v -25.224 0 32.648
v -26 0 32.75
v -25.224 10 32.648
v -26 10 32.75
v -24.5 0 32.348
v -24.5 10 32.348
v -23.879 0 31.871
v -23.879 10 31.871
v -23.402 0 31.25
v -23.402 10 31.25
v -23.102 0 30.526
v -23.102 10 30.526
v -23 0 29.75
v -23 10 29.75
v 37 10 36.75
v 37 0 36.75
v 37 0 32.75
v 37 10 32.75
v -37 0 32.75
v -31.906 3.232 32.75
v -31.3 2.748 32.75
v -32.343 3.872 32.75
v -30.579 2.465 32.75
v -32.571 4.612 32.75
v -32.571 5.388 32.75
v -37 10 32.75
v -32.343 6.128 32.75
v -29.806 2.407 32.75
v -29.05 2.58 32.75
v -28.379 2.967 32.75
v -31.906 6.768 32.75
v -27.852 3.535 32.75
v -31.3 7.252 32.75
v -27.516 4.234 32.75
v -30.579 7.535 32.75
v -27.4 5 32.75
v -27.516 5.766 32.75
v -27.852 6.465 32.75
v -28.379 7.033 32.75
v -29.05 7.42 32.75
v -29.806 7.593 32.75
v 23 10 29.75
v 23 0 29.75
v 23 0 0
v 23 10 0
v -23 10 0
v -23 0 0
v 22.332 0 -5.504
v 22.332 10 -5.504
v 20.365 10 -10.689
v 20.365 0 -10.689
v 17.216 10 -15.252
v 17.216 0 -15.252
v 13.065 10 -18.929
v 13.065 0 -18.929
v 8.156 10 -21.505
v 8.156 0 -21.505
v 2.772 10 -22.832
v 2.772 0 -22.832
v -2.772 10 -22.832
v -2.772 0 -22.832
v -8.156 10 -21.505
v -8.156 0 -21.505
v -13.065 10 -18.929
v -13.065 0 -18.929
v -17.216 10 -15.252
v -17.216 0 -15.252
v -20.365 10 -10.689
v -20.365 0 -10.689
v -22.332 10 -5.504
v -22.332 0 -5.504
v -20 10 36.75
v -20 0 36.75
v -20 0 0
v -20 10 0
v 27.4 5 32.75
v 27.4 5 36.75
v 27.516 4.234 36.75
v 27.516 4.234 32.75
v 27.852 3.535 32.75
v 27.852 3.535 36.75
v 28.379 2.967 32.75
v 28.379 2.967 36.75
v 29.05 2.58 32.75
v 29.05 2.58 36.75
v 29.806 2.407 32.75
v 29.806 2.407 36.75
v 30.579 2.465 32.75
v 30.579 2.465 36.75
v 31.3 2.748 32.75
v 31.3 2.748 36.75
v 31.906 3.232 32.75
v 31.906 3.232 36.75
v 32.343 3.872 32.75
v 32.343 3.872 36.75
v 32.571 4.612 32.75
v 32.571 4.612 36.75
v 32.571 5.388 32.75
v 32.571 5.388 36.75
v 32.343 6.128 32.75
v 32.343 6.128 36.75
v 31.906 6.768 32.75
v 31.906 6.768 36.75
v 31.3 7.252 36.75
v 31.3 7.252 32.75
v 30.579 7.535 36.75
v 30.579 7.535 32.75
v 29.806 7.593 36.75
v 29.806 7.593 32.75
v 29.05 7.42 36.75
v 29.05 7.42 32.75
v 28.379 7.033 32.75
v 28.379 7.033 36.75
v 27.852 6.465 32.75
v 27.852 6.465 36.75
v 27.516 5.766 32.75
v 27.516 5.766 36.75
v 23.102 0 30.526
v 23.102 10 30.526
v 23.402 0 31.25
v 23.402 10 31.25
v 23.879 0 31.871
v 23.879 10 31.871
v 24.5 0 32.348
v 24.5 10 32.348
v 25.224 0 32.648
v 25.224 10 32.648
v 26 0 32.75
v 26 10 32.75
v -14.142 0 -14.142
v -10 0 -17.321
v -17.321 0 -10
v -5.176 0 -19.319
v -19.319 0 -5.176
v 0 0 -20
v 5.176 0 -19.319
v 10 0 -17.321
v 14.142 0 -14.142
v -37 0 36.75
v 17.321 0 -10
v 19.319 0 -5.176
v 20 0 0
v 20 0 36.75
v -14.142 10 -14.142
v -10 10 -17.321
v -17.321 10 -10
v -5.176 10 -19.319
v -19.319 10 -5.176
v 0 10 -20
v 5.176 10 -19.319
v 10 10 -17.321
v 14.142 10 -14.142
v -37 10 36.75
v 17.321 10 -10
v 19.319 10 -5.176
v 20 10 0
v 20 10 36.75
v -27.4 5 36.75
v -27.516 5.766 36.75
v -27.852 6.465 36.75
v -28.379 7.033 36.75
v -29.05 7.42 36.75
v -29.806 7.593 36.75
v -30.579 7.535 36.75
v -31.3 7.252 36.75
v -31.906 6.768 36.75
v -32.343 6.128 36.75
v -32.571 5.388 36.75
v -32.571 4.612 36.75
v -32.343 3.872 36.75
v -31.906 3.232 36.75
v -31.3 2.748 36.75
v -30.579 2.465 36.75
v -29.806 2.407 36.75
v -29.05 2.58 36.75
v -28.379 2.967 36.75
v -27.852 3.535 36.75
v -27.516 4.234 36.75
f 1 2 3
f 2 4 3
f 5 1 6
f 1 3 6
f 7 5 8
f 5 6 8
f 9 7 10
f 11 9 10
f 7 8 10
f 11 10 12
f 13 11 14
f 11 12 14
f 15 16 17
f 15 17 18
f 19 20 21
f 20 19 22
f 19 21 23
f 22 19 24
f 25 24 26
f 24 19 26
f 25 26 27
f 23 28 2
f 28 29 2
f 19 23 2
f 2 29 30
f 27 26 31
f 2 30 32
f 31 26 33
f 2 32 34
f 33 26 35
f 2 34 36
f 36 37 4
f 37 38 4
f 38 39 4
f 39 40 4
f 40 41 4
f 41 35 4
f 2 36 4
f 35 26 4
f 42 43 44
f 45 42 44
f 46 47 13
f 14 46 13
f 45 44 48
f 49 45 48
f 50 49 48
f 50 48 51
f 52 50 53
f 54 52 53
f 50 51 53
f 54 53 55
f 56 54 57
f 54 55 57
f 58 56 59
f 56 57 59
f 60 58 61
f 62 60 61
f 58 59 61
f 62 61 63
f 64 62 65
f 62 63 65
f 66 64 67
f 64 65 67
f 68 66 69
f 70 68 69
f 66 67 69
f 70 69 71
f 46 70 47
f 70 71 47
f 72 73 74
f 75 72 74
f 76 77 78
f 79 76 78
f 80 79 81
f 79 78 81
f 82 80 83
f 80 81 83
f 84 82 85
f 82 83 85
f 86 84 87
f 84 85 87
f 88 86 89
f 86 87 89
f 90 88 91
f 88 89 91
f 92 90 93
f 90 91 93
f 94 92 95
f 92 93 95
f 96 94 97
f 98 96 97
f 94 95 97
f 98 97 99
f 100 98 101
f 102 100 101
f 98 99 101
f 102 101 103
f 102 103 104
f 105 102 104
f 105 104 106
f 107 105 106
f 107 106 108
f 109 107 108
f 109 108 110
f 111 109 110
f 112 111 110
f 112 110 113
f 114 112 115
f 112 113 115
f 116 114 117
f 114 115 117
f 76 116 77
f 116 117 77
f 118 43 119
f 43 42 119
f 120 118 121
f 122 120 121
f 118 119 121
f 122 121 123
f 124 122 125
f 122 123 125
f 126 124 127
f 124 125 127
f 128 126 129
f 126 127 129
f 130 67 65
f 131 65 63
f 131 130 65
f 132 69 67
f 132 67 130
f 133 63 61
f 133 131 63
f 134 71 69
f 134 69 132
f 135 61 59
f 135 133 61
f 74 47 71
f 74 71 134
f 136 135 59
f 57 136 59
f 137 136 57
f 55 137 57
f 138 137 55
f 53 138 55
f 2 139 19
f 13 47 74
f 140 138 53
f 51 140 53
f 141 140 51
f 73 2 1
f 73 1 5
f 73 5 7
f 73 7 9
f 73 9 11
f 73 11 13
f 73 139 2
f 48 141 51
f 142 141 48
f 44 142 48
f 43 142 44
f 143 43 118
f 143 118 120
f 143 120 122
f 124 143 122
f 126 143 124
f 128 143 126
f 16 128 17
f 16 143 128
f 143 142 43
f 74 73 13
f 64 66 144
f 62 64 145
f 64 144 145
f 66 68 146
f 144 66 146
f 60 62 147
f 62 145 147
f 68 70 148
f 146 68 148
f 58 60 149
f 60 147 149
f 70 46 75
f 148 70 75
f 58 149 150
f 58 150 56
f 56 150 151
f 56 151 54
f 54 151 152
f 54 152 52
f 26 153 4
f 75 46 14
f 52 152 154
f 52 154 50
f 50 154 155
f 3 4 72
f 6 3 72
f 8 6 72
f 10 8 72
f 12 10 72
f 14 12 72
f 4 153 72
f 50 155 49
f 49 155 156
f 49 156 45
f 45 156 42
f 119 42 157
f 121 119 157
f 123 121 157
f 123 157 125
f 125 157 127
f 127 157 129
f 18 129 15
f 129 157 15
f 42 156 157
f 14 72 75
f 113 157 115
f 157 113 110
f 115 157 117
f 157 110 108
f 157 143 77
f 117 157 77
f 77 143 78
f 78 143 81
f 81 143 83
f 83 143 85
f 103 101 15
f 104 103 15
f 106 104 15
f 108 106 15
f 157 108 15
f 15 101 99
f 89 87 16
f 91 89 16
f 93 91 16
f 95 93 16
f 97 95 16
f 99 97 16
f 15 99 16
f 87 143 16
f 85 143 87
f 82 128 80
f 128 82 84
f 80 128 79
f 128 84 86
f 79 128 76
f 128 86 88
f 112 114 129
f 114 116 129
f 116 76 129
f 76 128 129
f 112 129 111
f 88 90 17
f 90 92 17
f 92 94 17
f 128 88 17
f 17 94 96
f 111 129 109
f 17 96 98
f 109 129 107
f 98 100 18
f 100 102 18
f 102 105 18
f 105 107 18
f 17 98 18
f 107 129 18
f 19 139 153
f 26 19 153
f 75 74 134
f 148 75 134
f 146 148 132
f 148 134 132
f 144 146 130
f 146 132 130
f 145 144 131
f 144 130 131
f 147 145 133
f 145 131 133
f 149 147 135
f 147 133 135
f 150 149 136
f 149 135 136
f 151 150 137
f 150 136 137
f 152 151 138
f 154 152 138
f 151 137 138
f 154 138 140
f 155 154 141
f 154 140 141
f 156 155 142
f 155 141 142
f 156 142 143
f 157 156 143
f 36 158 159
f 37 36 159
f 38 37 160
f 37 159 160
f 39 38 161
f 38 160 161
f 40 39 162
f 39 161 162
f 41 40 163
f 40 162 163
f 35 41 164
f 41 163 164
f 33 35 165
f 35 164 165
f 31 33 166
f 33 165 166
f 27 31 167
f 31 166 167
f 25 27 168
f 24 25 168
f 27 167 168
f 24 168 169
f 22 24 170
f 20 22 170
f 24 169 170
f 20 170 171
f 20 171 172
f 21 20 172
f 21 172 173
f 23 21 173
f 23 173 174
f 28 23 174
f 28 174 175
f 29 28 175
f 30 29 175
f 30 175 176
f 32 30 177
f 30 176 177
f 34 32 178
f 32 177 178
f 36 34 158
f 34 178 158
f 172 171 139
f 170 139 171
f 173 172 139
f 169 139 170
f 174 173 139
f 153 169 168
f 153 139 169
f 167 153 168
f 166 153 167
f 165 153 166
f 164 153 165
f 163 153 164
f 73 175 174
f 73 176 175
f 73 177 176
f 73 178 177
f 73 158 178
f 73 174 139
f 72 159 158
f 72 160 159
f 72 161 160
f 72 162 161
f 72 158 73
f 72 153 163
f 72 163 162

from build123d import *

# Parameters (mm, degrees)
EXTRUDE_1_DEPTH = 10
SKETCH_2_W      = 14
SKETCH_2_H      = 10
SKETCH_2_R      = 2.6
EXTRUDE_2_DEPTH = 4
FILLET_1_R      = 3


with BuildPart() as part:
    # 草图1 → 凸台-拉伸1 (new body)
    with BuildSketch(Plane(origin=(0, 0, 0), x_dir=(1, 0, 0), z_dir=(0, 1, 0))):
        with BuildLine():
            Line((-23, 0), (-23, -36.75))
            Line((-23, -36.75), (-20, -36.75))
            Line((-20, -36.75), (-20, 0))
            ThreePointArc((-20, 0), (0, 20), (20, 0))
            Line((20, 0), (20, -36.75))
            Line((20, -36.75), (23, -36.75))
            Line((23, -36.75), (23, 0))
            ThreePointArc((23, 0), (0, 23), (-23, 0))
        make_face()
    extrude(amount=EXTRUDE_1_DEPTH)

    # 草图2 → 凸台-拉伸2 (add)
    # profile 1 of 2: a face of its own
    with BuildSketch(Plane.XY.offset(36.75)):
        with Locations((-30, 5)):
            Rectangle(SKETCH_2_W, SKETCH_2_H)
        with Locations((-30, 5)):
            Circle(SKETCH_2_R, mode=Mode.SUBTRACT)
    # profile 2 of 2: a face of its own
    with BuildSketch(Plane.XY.offset(36.75)):
        with Locations((30, 5)):
            Rectangle(SKETCH_2_W, SKETCH_2_H)
        with Locations(Location((30, 5, 0), (0, 0, 180))):
            Circle(SKETCH_2_R, mode=Mode.SUBTRACT)
    extrude(amount=-EXTRUDE_2_DEPTH)

    # 圆角1
    fillet_1_edges = [part.edges().sort_by_distance(p)[0] for p in [
        (-23, 5, 32.75),
        (23, 5, 32.75),
    ]]
    fillet(fillet_1_edges, radius=FILLET_1_R)


solid = part.part
